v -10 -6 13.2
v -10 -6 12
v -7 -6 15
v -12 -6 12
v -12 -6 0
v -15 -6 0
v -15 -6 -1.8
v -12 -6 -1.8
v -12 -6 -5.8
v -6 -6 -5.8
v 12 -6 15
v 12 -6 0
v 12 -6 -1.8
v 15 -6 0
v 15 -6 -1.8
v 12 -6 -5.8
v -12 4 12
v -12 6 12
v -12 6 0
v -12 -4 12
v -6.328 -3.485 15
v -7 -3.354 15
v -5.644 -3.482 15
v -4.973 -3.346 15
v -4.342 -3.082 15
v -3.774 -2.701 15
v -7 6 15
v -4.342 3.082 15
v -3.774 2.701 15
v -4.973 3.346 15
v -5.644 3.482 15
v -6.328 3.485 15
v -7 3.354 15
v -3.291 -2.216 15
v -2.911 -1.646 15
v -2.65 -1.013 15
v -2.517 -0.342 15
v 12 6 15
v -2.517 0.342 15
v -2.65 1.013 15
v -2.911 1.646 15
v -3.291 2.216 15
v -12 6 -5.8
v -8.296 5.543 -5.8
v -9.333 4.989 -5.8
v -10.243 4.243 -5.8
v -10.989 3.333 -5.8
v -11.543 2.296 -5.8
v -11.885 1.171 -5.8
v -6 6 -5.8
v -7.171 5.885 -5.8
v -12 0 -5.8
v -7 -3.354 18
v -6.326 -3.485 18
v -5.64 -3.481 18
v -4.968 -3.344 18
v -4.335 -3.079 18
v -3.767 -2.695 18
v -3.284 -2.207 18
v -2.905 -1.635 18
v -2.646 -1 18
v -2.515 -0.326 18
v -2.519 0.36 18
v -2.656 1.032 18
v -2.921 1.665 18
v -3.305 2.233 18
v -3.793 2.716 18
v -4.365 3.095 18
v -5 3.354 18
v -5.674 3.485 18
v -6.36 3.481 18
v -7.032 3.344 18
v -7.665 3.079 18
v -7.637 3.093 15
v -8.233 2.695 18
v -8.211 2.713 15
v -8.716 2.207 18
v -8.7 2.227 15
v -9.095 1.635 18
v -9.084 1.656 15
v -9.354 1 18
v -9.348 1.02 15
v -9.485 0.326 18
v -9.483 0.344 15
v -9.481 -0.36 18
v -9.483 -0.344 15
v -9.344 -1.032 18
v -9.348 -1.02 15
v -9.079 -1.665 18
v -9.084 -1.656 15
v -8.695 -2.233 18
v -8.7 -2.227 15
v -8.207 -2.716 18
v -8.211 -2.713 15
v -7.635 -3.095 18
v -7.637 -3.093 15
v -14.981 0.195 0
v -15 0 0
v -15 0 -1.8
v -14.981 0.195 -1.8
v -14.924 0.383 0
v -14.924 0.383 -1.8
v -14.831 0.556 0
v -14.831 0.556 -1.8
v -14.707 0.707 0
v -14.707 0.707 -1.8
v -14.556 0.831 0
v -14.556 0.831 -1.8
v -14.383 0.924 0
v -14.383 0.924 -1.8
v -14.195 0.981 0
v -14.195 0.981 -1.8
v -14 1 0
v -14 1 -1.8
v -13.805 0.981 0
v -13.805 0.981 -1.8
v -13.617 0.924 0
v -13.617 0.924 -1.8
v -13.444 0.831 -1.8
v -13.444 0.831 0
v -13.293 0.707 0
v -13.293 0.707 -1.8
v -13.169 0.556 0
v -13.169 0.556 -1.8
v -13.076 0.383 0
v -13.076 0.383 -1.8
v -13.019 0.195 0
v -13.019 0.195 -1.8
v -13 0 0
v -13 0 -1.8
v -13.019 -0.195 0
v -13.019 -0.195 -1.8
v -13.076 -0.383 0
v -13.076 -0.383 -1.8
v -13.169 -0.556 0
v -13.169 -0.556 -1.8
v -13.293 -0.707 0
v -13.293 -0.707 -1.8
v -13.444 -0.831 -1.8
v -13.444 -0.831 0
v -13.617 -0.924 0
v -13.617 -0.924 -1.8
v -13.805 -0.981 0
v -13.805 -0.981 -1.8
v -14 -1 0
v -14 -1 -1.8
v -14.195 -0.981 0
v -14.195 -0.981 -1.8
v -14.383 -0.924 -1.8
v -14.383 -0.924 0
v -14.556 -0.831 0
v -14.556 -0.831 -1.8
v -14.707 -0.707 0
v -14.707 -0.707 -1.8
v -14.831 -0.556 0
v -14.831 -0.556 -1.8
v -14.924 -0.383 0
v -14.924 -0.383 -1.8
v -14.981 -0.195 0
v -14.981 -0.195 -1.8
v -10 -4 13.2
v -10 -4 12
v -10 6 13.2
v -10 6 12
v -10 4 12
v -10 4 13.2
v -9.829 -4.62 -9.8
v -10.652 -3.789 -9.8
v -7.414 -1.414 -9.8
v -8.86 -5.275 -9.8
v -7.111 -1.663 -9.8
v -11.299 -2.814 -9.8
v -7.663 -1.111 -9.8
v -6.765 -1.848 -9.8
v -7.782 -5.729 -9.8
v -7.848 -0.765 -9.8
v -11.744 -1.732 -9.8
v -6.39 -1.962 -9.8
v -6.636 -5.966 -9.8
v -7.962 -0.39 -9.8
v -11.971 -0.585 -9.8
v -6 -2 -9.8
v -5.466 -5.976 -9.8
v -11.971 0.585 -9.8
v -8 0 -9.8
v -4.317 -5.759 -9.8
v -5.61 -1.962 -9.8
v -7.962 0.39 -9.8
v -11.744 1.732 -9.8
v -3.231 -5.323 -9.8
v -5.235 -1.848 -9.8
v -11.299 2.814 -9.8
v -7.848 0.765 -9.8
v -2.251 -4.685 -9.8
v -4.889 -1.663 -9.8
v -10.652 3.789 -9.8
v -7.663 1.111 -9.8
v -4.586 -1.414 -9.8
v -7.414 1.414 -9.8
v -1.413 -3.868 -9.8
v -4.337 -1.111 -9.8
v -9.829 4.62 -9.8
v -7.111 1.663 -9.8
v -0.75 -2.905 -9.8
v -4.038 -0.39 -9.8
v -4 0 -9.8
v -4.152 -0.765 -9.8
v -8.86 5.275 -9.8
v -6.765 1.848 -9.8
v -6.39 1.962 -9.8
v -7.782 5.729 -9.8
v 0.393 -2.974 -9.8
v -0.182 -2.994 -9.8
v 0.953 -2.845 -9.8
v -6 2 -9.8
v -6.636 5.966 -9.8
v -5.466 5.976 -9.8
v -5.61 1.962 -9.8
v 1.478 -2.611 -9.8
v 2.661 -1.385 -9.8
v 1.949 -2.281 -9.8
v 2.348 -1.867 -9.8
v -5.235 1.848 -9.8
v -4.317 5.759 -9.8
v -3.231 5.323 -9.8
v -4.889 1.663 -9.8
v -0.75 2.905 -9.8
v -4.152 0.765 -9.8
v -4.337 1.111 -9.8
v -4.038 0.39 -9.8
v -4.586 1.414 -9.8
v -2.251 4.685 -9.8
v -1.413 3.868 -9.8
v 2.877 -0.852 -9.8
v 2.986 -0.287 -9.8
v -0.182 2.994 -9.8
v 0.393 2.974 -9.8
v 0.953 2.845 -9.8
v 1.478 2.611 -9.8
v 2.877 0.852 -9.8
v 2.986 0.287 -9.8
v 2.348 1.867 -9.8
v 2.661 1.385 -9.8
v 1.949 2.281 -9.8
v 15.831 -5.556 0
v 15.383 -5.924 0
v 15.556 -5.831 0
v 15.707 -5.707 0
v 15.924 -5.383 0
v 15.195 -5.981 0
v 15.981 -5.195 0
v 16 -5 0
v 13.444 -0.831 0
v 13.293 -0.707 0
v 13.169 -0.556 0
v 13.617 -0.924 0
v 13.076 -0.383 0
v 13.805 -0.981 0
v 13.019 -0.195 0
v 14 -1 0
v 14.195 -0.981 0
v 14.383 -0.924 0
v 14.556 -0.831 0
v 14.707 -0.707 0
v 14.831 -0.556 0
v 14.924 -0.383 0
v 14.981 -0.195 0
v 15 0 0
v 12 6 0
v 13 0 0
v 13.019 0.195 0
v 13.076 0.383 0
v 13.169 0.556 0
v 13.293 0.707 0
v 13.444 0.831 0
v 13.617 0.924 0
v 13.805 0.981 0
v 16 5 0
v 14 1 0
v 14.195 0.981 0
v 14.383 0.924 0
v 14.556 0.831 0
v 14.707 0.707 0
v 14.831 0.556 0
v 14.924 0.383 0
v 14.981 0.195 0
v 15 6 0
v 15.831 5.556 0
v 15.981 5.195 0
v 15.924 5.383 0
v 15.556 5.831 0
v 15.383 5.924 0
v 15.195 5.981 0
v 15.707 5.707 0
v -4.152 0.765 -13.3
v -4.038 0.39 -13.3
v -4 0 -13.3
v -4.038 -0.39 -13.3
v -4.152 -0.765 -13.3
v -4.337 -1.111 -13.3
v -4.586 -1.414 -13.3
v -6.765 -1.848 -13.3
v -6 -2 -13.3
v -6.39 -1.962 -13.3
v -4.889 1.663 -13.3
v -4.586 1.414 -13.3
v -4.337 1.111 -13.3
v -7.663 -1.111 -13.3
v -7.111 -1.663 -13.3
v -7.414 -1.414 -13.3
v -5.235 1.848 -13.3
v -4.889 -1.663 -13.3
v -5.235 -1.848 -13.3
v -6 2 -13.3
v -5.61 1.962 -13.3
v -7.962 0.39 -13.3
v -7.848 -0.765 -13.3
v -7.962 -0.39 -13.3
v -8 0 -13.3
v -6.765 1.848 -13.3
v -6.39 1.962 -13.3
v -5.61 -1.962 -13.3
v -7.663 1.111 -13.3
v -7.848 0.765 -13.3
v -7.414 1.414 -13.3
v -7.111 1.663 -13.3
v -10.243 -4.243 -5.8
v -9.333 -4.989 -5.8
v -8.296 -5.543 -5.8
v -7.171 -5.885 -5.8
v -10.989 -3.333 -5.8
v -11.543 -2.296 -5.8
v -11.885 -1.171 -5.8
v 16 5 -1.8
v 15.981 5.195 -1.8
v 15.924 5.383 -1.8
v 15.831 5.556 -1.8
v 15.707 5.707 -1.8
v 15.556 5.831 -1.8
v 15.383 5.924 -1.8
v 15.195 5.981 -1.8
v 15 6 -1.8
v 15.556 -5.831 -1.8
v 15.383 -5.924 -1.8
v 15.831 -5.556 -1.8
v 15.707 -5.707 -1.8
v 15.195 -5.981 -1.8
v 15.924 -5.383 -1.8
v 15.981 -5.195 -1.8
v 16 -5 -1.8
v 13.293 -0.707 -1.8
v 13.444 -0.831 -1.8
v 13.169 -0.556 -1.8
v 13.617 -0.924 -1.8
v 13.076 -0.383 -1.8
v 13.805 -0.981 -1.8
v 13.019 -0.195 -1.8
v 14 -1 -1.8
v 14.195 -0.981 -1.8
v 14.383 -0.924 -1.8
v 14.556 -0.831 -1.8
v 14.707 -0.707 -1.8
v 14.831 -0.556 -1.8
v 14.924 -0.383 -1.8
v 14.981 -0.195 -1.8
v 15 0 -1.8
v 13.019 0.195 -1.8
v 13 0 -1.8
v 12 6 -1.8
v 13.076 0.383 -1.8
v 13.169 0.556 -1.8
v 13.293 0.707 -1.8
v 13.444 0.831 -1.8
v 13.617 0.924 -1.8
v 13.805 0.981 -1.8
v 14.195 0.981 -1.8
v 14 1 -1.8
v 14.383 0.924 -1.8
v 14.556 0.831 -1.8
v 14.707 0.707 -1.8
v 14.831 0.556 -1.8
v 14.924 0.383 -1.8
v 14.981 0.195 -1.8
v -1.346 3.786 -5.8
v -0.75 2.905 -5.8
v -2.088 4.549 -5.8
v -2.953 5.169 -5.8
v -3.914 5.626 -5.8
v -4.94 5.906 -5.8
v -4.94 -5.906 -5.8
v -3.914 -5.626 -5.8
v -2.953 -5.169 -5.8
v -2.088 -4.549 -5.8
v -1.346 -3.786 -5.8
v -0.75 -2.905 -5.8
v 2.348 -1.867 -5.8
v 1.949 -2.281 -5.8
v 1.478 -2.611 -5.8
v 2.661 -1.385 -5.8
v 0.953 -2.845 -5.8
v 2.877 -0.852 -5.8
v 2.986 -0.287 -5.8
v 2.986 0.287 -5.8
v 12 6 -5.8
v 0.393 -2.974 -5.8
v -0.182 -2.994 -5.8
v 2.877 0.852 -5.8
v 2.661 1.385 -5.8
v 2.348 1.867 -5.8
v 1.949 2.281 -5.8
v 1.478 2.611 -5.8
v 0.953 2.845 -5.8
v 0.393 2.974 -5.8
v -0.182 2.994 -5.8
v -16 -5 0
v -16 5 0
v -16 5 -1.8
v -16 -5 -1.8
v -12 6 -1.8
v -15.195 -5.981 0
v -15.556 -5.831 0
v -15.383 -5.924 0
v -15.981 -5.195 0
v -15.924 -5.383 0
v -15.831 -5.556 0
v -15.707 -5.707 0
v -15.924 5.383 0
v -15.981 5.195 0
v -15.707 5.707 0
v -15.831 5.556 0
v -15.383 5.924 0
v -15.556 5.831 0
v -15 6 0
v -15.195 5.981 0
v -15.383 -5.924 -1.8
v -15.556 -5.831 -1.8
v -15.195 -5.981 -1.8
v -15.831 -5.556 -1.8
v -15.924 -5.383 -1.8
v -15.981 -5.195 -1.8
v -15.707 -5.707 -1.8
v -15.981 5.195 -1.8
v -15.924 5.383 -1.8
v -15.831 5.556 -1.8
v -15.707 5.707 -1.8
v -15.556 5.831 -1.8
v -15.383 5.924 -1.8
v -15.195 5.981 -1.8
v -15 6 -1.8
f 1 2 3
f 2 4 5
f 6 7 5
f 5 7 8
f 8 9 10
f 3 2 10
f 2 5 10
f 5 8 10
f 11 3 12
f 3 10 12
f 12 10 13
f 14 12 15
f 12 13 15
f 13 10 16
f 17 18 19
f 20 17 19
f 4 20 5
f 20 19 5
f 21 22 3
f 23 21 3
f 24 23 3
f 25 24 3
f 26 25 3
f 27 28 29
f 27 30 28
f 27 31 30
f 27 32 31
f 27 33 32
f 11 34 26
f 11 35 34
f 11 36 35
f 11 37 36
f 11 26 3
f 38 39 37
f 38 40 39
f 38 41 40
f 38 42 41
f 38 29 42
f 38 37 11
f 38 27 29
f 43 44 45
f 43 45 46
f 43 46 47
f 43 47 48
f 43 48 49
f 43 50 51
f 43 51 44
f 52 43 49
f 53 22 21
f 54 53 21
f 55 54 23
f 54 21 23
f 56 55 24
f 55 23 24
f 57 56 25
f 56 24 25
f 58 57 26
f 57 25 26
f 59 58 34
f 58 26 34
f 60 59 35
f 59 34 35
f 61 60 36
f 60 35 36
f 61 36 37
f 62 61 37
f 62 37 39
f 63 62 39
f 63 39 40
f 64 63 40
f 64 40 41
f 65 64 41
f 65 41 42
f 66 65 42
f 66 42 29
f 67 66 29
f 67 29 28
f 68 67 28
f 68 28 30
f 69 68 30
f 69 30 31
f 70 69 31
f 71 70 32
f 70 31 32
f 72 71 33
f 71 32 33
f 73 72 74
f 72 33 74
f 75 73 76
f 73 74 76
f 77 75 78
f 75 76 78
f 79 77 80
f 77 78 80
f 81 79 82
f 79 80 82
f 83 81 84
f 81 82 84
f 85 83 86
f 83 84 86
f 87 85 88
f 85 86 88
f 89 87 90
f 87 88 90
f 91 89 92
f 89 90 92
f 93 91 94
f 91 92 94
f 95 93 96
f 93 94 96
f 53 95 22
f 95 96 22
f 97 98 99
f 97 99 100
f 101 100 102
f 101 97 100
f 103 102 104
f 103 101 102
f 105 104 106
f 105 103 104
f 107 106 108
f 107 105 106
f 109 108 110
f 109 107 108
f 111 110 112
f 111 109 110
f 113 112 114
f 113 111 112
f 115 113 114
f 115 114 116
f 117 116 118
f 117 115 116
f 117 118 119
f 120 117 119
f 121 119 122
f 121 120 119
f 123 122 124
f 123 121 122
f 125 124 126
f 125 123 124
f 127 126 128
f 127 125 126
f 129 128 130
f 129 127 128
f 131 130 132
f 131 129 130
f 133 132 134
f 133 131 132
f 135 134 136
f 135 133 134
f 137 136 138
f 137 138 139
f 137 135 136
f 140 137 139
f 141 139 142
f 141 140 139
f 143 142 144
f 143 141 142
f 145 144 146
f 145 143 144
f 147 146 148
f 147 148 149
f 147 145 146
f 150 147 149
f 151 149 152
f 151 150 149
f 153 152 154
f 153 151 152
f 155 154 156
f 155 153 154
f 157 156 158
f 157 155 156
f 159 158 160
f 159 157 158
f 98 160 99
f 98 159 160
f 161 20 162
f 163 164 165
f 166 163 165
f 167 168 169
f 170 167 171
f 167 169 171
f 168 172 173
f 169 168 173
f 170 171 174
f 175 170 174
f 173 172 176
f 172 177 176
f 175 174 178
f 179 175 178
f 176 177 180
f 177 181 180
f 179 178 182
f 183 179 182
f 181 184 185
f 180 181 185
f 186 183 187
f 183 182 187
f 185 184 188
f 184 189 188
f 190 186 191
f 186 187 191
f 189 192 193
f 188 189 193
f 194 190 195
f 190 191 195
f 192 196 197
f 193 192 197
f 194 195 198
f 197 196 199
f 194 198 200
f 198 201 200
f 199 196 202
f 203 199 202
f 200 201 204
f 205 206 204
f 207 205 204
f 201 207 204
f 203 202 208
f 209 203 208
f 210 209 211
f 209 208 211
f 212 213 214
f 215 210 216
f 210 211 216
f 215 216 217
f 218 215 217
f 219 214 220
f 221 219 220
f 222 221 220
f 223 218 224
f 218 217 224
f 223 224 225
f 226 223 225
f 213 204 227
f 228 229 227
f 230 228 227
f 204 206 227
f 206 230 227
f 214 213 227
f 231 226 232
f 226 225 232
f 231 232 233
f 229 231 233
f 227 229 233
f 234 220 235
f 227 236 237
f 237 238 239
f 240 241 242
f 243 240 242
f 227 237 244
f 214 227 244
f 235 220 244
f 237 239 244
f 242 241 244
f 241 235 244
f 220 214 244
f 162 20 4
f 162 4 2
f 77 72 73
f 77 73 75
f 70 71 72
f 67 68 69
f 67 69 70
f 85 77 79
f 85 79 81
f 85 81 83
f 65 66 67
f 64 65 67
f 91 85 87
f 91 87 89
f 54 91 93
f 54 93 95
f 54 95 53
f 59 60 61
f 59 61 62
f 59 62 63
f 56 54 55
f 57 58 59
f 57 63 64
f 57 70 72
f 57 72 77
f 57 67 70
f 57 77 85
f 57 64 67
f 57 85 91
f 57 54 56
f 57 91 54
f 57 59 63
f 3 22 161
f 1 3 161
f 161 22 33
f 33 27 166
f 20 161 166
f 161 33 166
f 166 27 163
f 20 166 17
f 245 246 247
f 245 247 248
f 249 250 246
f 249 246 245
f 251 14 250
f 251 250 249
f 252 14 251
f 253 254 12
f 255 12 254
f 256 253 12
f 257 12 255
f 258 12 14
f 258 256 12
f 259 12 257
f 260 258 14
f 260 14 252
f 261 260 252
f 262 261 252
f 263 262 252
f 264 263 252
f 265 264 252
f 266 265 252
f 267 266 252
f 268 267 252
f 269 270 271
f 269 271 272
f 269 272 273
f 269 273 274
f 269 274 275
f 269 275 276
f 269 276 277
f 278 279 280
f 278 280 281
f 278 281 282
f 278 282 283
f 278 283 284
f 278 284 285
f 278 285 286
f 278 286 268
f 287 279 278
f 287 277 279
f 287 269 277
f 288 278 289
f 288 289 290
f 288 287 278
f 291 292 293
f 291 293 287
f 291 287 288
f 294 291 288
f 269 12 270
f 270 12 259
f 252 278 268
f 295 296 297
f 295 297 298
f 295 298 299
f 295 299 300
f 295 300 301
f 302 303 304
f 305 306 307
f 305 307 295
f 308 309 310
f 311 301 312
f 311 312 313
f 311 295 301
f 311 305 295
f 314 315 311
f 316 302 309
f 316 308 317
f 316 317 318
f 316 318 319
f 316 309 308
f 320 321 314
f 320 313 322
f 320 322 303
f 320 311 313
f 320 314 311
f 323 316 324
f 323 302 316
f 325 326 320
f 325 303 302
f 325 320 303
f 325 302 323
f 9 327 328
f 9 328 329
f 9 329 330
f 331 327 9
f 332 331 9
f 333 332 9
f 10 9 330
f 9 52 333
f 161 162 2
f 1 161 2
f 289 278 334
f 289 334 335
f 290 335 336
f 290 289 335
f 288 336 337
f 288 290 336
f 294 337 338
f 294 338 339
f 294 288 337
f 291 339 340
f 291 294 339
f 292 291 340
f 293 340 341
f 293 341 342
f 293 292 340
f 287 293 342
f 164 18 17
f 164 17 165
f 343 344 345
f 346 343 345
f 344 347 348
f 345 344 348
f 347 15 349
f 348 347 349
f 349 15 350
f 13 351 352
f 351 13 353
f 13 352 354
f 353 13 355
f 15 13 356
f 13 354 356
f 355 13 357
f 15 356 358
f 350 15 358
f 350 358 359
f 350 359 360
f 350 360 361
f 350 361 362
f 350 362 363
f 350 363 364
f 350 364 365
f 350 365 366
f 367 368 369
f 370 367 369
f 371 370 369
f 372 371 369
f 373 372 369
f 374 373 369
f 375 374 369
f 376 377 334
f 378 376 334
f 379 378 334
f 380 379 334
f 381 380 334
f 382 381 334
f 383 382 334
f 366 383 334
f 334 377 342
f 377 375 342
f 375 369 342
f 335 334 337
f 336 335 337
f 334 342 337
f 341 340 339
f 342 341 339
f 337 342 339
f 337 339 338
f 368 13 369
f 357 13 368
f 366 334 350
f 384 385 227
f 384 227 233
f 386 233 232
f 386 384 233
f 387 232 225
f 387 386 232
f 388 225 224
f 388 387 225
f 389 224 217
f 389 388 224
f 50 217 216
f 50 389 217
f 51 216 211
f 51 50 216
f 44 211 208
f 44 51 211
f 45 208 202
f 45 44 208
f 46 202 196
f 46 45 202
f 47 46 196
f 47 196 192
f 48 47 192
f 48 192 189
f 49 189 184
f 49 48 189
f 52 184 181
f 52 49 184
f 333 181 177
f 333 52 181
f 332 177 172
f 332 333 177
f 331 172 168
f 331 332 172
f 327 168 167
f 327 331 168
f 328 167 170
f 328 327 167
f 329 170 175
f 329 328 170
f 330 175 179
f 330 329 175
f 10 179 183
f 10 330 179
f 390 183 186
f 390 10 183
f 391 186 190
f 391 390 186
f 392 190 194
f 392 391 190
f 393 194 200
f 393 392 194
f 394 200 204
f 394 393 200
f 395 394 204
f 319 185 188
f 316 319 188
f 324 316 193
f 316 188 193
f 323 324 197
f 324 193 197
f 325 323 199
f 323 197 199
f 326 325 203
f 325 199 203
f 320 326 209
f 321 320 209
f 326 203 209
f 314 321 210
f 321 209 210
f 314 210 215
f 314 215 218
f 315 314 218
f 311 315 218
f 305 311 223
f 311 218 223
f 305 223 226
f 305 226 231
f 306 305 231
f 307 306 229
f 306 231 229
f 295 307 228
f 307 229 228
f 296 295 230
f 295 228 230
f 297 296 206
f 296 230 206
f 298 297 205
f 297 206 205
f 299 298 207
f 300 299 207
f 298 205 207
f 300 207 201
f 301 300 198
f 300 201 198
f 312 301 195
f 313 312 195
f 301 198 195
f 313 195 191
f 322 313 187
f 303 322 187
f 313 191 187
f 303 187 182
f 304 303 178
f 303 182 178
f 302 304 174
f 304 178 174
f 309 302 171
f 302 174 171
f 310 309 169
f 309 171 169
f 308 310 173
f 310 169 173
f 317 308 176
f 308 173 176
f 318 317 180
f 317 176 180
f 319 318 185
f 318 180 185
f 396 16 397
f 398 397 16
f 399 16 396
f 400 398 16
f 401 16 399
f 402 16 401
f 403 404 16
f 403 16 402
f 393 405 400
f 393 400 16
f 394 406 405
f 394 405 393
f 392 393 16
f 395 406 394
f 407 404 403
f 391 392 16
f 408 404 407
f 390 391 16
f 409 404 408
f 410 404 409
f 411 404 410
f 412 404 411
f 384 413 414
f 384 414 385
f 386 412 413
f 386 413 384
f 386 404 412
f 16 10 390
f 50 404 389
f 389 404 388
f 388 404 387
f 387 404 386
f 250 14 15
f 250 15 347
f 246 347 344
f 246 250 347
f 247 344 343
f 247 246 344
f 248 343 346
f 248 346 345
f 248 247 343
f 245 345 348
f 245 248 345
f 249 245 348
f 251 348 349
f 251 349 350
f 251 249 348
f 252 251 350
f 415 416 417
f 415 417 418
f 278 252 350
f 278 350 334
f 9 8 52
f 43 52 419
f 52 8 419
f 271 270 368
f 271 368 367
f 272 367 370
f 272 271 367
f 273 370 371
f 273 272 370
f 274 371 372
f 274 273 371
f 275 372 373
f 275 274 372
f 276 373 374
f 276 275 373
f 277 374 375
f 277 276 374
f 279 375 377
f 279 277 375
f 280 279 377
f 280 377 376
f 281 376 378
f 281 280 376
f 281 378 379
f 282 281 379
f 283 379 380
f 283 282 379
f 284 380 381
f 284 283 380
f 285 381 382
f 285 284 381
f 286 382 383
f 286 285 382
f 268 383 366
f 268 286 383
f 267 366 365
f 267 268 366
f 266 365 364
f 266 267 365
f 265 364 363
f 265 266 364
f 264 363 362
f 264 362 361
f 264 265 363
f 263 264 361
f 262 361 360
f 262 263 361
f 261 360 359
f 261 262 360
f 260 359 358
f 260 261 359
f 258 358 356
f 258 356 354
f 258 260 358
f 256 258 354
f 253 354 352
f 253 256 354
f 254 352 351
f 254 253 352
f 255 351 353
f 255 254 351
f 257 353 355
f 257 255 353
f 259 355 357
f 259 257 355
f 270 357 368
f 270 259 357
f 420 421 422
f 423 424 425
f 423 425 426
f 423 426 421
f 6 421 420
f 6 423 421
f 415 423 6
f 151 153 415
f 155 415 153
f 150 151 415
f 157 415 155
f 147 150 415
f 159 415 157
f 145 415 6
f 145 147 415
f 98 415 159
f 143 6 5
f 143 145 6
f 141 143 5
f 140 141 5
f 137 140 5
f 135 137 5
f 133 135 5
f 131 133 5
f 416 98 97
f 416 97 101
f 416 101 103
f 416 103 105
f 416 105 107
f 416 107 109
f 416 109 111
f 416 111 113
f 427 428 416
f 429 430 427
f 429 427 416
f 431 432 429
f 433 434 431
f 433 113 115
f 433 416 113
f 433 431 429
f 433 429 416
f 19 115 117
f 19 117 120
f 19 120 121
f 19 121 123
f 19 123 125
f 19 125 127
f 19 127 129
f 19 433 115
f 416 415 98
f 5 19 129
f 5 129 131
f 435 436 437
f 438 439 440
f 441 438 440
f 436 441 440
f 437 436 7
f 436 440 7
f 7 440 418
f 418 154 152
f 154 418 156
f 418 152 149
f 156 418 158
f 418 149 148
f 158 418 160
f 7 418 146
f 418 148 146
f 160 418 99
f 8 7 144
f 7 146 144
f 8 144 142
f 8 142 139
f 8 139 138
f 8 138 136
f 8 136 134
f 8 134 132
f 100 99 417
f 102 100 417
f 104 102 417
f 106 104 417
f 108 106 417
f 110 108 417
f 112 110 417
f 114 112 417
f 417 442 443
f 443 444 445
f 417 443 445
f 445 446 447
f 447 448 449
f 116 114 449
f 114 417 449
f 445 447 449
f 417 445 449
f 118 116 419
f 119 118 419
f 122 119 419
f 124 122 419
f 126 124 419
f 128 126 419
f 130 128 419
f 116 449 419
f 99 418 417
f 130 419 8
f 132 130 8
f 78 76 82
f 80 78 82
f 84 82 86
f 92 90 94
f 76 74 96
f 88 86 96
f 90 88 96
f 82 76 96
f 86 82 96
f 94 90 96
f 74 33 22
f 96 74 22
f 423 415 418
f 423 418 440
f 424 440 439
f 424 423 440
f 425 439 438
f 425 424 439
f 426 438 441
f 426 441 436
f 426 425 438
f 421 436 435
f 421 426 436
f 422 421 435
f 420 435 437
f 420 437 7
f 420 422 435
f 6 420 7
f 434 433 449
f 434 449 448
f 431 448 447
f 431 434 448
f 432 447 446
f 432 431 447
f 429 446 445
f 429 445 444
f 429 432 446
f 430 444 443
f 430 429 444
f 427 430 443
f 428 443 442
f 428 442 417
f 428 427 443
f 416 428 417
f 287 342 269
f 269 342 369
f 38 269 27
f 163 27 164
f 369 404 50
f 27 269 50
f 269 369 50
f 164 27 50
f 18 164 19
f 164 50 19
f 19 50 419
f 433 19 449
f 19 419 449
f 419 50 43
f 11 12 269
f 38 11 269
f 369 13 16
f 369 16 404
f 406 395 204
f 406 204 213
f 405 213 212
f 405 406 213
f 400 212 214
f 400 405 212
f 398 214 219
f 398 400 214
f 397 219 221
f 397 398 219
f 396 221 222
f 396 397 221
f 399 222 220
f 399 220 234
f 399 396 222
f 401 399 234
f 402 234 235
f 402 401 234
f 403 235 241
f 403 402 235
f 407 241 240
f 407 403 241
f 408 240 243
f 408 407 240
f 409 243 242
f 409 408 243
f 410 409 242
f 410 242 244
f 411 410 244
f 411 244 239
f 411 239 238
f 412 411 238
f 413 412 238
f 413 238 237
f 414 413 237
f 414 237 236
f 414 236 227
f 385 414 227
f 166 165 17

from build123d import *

# Parameters (mm, degrees)
SKETCH_1_W          = 24
SKETCH_1_H          = 12
EXTRUDE_1_DEPTH     = 12
SKETCH_2_R          = 1
EXTRUDE_2_DEPTH     = 1.8
SKETCH_3_W          = 24
SKETCH_3_H          = 12
EXTRUDE_3_DEPTH     = 4
EXTRUDE_4_DEPTH     = 4
SKETCH_5_R          = 2
EXTRUDE_5_DEPTH     = 3.5
EXTRUDE_6_DEPTH     = 3
CUT_EXTRUDE_1_DEPTH = 12
SKETCH_9_R          = 3.5
EXTRUDE_7_DEPTH     = 3


with BuildPart() as part:
    # Эскиз1 → Бобышка-Вытянуть1 (new body)
    with BuildSketch(Plane.XY):
        Rectangle(SKETCH_1_W, SKETCH_1_H)
    extrude(amount=EXTRUDE_1_DEPTH)

    # Эскиз2 → Бобышка-Вытянуть2 (add)
    with BuildSketch(Plane(origin=(0, 0, 0), x_dir=(-1, 0, 0), z_dir=(0, 0, -1))):
        with BuildLine():
            Line((12, 6), (15, 6))
            ThreePointArc((15, 6), (15.707106781, 5.707106781), (16, 5))
            Line((16, 5), (16, -5))
            ThreePointArc((16, -5), (15.707106781, -5.707106781), (15, -6))
            Line((15, -6), (12, -6))
            Line((12, -6), (-12, -6))
            Line((-12, -6), (-15, -6))
            ThreePointArc((-15, -6), (-15.707106781, -5.707106781), (-16, -5))
            Line((-16, -5), (-16, 5))
            ThreePointArc((-16, 5), (-15.707106781, 5.707106781), (-15, 6))
            Line((-15, 6), (-12, 6))
            Line((-12, 6), (12, 6))
        make_face()
        with Locations((14, 0)):
            Circle(SKETCH_2_R, mode=Mode.SUBTRACT)
        with Locations((-14, 0)):
            Circle(SKETCH_2_R, mode=Mode.SUBTRACT)
    extrude(amount=EXTRUDE_2_DEPTH)

    # Эскиз3 → Бобышка-Вытянуть3 (add)
    with BuildSketch(Plane(origin=(0, 0, -1.8), x_dir=(-1, 0, 0), z_dir=(0, 0, -1))):
        Rectangle(SKETCH_3_W, SKETCH_3_H)
    extrude(amount=EXTRUDE_3_DEPTH)

    # Эскиз4 → Бобышка-Вытянуть4 (add)
    with BuildSketch(Plane(origin=(0, 0, -5.8), x_dir=(-1, 0, 0), z_dir=(0, 0, -1))):
        with BuildLine():
            ThreePointArc((0.75, 2.90473751), (12, 0), (0.75, -2.90473751))
            ThreePointArc((0.75, -2.90473751), (-3, 0), (0.75, 2.90473751))
        make_face()
    extrude(amount=EXTRUDE_4_DEPTH)

    # Эскиз5 → Бобышка-Вытянуть5 (add)
    with BuildSketch(Plane(origin=(0, 0, -9.8), x_dir=(-1, 0, 0), z_dir=(0, 0, -1))):
        with Locations((6, 0)):
            Circle(SKETCH_5_R)
    extrude(amount=EXTRUDE_5_DEPTH)

    # Эскиз6 → Бобышка-Вытянуть6 (add)
    with BuildSketch(Plane.XY.offset(12)):
        Polygon((12, -6), (12, 6), (-10, 6), (-10, 4), (-12, 4), (-12, -4), (-10, -4), (-10, -6), align=None)
    extrude(amount=EXTRUDE_6_DEPTH)

    # Эскиз8 → Вырез-Вытянуть1 (cut)
    with BuildSketch(Plane(origin=(0, 6, 0), x_dir=(1, 0, 0), z_dir=(0, 1, 0))):
        Polygon((-7, -15), (-12, -12), (-12, -15), align=None)
    extrude(amount=-CUT_EXTRUDE_1_DEPTH, mode=Mode.SUBTRACT)

    # Эскиз9 → Бобышка-Вытянуть7 (add)
    with BuildSketch(Plane.XY.offset(15)):
        with Locations(Location((-6, 0, 0), (0, 0, 253.398450401))):
            Circle(SKETCH_9_R)
    extrude(amount=EXTRUDE_7_DEPTH)


solid = part.part
